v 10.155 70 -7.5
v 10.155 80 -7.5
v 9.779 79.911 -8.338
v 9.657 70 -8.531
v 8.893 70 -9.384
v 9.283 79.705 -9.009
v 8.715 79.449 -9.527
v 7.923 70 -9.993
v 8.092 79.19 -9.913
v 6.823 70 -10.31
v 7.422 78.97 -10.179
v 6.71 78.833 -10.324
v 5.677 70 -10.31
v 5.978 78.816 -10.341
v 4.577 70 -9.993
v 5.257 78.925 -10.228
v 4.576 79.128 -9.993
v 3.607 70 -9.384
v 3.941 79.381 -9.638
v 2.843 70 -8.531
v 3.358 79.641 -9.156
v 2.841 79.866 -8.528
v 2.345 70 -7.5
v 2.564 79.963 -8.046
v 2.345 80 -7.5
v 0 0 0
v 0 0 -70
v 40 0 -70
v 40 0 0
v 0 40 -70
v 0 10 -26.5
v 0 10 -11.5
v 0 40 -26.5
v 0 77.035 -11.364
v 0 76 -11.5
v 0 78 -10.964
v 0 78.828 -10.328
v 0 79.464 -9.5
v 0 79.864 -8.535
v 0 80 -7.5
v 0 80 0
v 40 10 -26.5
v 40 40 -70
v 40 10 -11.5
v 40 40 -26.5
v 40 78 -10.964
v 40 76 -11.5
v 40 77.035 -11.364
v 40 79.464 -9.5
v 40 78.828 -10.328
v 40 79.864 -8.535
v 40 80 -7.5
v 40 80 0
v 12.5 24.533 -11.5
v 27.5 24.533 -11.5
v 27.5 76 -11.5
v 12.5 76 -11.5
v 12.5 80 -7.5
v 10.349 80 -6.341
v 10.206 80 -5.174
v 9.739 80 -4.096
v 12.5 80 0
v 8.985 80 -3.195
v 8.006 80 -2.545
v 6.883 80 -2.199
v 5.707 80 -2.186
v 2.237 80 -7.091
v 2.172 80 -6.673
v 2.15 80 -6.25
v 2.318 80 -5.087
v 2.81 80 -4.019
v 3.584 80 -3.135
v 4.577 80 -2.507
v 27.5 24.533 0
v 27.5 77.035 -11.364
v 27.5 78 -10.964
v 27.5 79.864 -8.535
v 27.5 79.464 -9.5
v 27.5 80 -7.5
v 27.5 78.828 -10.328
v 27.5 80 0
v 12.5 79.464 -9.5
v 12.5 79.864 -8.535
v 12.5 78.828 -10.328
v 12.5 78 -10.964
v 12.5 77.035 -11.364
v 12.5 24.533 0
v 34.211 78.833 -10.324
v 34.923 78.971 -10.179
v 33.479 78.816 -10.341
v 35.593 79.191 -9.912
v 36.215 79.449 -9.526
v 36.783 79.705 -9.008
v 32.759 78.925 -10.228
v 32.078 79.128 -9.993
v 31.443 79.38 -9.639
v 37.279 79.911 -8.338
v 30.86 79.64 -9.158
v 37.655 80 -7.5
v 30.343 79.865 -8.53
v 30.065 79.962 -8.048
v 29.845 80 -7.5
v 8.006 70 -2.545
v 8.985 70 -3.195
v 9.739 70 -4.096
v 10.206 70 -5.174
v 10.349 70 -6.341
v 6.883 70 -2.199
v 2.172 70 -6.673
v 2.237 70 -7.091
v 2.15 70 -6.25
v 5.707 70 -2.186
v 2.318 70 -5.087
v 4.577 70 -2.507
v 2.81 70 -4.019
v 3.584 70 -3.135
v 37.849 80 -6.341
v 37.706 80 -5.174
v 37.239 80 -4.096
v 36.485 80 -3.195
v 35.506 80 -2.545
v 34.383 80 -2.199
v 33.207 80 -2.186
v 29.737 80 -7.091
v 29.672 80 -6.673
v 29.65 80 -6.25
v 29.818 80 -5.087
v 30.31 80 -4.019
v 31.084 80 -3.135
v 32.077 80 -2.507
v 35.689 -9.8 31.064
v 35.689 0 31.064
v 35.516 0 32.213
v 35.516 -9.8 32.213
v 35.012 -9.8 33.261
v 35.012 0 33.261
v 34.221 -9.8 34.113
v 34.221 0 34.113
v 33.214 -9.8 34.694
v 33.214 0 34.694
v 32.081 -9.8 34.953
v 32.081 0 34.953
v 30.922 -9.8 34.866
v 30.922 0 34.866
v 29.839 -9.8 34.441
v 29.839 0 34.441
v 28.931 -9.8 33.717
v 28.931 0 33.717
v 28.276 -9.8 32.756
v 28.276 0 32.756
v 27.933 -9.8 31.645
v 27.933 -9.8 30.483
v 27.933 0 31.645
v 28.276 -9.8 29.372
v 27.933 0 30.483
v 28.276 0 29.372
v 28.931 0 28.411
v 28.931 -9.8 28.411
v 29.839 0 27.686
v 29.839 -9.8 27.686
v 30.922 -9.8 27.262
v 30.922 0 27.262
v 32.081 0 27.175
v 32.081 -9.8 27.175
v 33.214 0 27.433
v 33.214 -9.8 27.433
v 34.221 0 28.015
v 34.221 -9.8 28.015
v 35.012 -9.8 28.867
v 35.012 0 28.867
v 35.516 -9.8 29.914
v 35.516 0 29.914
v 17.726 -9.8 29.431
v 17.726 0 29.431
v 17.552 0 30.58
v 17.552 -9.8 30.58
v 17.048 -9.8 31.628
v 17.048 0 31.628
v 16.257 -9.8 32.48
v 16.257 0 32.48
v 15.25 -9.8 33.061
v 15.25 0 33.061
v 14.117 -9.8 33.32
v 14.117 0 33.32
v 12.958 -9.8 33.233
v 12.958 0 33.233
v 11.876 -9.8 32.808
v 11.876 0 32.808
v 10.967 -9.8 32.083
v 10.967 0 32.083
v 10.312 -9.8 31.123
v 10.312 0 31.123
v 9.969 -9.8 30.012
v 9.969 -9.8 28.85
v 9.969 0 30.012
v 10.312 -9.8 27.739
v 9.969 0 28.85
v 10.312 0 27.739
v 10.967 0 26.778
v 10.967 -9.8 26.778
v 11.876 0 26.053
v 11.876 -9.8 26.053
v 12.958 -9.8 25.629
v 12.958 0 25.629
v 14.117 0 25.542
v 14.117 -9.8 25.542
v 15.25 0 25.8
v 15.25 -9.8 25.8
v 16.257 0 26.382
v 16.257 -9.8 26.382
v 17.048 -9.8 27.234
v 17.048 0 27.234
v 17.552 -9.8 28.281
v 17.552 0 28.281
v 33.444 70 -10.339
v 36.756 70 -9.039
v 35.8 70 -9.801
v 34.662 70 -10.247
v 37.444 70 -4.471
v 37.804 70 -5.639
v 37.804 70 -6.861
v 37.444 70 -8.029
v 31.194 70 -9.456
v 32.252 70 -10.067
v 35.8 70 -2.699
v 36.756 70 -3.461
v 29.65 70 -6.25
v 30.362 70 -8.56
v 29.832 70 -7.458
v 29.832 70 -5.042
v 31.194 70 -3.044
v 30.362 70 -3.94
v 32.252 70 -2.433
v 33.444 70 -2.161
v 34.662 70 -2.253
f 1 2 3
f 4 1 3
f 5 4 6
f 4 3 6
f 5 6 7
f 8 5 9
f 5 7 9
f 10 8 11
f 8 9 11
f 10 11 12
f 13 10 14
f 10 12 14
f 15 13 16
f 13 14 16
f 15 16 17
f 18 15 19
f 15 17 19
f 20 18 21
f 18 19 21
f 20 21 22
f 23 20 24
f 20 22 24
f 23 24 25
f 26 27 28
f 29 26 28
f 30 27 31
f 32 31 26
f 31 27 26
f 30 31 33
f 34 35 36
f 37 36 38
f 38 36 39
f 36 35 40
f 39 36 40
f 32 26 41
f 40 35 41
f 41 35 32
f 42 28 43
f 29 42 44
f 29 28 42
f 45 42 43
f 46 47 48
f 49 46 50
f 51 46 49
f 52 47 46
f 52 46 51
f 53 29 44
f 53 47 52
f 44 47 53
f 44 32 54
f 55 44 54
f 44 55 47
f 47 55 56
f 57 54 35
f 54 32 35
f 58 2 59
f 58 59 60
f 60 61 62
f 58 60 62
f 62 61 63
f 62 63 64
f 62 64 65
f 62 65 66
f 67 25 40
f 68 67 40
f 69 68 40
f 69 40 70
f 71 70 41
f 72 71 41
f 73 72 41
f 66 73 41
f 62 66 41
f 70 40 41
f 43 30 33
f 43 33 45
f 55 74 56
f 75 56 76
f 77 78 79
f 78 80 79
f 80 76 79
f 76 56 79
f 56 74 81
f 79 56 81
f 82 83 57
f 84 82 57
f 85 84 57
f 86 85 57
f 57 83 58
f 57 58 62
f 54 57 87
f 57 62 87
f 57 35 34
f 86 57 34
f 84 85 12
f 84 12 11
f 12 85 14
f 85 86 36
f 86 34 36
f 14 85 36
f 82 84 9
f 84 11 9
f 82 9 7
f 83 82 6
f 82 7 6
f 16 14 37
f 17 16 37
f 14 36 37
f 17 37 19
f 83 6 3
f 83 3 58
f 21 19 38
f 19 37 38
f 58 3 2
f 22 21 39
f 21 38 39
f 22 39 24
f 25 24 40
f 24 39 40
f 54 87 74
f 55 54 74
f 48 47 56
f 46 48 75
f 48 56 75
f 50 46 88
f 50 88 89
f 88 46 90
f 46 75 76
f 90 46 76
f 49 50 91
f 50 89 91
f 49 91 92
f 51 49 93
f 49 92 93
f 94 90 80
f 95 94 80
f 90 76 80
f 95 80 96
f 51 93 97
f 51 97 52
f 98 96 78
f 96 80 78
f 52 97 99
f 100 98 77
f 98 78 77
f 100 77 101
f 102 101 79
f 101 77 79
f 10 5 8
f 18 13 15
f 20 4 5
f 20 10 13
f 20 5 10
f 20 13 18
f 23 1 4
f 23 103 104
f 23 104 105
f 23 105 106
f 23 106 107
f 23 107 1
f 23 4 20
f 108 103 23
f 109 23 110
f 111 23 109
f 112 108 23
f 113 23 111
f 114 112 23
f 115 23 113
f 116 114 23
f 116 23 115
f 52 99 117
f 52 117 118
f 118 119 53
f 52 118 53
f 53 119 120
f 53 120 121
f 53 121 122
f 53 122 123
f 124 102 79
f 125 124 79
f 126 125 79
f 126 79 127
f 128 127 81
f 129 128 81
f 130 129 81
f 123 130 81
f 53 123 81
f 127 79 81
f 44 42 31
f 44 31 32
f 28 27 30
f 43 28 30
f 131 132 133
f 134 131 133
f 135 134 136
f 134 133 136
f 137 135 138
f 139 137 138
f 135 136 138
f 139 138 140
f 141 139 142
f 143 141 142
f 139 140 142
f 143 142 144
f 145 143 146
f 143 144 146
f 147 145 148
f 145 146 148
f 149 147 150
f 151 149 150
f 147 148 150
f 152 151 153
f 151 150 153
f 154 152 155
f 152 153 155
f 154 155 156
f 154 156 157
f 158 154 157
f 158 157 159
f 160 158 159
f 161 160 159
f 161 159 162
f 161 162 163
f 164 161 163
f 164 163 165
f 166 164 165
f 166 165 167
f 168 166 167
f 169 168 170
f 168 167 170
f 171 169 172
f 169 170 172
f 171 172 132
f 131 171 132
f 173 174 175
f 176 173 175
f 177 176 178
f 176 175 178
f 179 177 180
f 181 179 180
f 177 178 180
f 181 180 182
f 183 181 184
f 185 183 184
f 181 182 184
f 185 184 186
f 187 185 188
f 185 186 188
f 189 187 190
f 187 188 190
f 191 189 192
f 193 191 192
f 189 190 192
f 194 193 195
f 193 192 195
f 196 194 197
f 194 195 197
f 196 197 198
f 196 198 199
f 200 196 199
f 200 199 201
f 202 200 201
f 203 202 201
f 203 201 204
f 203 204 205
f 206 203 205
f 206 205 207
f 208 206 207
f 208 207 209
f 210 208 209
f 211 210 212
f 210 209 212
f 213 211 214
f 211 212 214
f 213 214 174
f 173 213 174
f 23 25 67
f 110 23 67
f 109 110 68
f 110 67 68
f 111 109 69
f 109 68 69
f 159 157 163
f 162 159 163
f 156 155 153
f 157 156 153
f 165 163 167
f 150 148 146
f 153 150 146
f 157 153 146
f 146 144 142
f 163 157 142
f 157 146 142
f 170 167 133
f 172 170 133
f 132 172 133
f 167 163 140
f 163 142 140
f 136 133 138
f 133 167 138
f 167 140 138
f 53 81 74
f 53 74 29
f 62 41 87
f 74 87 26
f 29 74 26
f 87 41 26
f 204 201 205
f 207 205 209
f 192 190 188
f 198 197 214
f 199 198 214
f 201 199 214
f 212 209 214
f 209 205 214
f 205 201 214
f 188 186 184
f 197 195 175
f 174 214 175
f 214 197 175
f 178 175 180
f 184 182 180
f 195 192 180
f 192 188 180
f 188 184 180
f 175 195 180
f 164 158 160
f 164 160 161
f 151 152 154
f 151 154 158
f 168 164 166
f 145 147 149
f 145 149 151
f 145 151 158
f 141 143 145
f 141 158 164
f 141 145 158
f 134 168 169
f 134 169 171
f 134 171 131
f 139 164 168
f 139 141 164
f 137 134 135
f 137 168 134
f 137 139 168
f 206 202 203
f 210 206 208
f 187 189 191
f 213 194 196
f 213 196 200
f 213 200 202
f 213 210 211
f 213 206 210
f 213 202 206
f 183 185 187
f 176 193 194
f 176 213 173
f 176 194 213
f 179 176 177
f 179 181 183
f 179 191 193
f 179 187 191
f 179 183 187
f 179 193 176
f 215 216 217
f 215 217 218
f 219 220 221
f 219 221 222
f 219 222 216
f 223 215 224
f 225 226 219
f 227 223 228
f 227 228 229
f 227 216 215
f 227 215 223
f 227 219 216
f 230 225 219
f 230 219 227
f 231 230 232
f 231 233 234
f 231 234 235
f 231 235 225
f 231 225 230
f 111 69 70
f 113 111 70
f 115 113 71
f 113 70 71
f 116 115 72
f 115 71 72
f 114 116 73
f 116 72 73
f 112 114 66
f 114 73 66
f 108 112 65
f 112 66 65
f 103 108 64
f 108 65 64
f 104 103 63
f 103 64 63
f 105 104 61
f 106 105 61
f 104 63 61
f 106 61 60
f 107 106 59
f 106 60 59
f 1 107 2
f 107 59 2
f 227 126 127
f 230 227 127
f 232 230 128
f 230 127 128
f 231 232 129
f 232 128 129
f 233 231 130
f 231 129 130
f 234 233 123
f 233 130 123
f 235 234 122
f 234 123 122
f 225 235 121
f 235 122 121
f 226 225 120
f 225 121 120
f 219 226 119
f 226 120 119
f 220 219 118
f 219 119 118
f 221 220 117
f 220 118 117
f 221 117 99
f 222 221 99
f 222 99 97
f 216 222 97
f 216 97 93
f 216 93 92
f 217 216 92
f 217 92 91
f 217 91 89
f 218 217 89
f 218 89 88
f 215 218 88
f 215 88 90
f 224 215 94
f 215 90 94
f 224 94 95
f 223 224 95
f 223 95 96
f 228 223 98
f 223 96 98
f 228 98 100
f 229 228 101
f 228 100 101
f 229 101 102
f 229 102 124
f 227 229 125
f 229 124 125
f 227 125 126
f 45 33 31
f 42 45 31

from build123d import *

# Parameters (mm, degrees)
F1_DEPTH = 40
F3_DEPTH = 13
F4_DEPTH = 30
F5_R     = 4.1
F6_DEPTH = 10
F7_R     = 3.9
F8_DEPTH = 9.8


with BuildPart() as f1:
    # F0 (on Right) → F1 (new body)
    with BuildSketch(Plane.YZ):
        with BuildLine():
            Line((80, 0), (0, 0))
            Line((0, 0), (0, -40))
            Line((0, -40), (40, -40))
            Line((40, -40), (40, -26.5))
            Line((40, -26.5), (10, -26.5))
            Line((10, -26.5), (10, -11.5))
            Line((10, -11.5), (76, -11.5))
            ThreePointArc((76, -11.5), (78.8284271247, -10.3284271247), (80, -7.5))
            Line((80, -7.5), (80, 0))
        make_face()
    extrude(amount=F1_DEPTH)

    # F2 (on face) → F3 (cut)
    with BuildSketch(Plane.XY):
        Polygon((23.5, 61.394763397), (27.5, 55.0439104359), (27.5, 80), (12.5, 80), (12.5, 54.4665601667), (16, 61.1060882624), align=None)
        Polygon((16.5, 48.1157072056), (24, 48.4043823402), (27.5, 55.0439104359), (23.5, 61.394763397), (16, 61.1060882624), (12.5, 54.4665601667), align=None)
        Polygon((27.5, 55.0439104359), (24, 48.4043823402), (16.5, 48.1157072056), (12.5, 54.4665601667), (12.5, 24.5333899457), (27.5, 24.5333899457), align=None)
    extrude(amount=-F3_DEPTH, mode=Mode.SUBTRACT)

    # F4 (add): a face of the model
    f4_faces = [f1.faces().sort_by_distance(p)[0] for p in [
        (20, 20, -40),
    ]]
    extrude(f4_faces, amount=F4_DEPTH)

    # F5 (on face) → F6 (cut)
    with BuildSketch(Plane(origin=(0, 80, 0), x_dir=(-1, 0, 0), z_dir=(0, 1, 0))):
        with Locations((-33.75, -6.25)):
            Circle(F5_R)
        with BuildLine():
            Line((-2.3451952674, -7.5), (-10.1548047326, -7.5))
            ThreePointArc((-10.1548047326, -7.5), (-6.25, -10.35), (-2.3451952674, -7.5))
        make_face()
        with BuildLine():
            ThreePointArc((-2.3451952674, -7.5), (-2.199092731, -6.882574342), (-2.15, -6.25))
            ThreePointArc((-2.15, -6.25), (-6.882574342, -2.199092731), (-10.1548047326, -7.5))
            Line((-10.1548047326, -7.5), (-2.3451952674, -7.5))
        make_face()
    extrude(amount=-F6_DEPTH, mode=Mode.SUBTRACT)


with BuildPart() as f8:
    # F7 (on Front) → F8 (new body)
    with BuildSketch(Plane.XZ):
        with Locations((31.7894656528, 31.0638957384)):
            Circle(F7_R)
    extrude(amount=F8_DEPTH)


with BuildPart() as f8b:
    # F7 (on Front) → F8, piece 2 (new body)
    with BuildSketch(Plane.XZ):
        with Locations((13.8255626981, 29.4308128513)):
            Circle(F7_R)
    extrude(amount=F8_DEPTH)


solid = Compound([f1.part, f8.part, f8b.part])
